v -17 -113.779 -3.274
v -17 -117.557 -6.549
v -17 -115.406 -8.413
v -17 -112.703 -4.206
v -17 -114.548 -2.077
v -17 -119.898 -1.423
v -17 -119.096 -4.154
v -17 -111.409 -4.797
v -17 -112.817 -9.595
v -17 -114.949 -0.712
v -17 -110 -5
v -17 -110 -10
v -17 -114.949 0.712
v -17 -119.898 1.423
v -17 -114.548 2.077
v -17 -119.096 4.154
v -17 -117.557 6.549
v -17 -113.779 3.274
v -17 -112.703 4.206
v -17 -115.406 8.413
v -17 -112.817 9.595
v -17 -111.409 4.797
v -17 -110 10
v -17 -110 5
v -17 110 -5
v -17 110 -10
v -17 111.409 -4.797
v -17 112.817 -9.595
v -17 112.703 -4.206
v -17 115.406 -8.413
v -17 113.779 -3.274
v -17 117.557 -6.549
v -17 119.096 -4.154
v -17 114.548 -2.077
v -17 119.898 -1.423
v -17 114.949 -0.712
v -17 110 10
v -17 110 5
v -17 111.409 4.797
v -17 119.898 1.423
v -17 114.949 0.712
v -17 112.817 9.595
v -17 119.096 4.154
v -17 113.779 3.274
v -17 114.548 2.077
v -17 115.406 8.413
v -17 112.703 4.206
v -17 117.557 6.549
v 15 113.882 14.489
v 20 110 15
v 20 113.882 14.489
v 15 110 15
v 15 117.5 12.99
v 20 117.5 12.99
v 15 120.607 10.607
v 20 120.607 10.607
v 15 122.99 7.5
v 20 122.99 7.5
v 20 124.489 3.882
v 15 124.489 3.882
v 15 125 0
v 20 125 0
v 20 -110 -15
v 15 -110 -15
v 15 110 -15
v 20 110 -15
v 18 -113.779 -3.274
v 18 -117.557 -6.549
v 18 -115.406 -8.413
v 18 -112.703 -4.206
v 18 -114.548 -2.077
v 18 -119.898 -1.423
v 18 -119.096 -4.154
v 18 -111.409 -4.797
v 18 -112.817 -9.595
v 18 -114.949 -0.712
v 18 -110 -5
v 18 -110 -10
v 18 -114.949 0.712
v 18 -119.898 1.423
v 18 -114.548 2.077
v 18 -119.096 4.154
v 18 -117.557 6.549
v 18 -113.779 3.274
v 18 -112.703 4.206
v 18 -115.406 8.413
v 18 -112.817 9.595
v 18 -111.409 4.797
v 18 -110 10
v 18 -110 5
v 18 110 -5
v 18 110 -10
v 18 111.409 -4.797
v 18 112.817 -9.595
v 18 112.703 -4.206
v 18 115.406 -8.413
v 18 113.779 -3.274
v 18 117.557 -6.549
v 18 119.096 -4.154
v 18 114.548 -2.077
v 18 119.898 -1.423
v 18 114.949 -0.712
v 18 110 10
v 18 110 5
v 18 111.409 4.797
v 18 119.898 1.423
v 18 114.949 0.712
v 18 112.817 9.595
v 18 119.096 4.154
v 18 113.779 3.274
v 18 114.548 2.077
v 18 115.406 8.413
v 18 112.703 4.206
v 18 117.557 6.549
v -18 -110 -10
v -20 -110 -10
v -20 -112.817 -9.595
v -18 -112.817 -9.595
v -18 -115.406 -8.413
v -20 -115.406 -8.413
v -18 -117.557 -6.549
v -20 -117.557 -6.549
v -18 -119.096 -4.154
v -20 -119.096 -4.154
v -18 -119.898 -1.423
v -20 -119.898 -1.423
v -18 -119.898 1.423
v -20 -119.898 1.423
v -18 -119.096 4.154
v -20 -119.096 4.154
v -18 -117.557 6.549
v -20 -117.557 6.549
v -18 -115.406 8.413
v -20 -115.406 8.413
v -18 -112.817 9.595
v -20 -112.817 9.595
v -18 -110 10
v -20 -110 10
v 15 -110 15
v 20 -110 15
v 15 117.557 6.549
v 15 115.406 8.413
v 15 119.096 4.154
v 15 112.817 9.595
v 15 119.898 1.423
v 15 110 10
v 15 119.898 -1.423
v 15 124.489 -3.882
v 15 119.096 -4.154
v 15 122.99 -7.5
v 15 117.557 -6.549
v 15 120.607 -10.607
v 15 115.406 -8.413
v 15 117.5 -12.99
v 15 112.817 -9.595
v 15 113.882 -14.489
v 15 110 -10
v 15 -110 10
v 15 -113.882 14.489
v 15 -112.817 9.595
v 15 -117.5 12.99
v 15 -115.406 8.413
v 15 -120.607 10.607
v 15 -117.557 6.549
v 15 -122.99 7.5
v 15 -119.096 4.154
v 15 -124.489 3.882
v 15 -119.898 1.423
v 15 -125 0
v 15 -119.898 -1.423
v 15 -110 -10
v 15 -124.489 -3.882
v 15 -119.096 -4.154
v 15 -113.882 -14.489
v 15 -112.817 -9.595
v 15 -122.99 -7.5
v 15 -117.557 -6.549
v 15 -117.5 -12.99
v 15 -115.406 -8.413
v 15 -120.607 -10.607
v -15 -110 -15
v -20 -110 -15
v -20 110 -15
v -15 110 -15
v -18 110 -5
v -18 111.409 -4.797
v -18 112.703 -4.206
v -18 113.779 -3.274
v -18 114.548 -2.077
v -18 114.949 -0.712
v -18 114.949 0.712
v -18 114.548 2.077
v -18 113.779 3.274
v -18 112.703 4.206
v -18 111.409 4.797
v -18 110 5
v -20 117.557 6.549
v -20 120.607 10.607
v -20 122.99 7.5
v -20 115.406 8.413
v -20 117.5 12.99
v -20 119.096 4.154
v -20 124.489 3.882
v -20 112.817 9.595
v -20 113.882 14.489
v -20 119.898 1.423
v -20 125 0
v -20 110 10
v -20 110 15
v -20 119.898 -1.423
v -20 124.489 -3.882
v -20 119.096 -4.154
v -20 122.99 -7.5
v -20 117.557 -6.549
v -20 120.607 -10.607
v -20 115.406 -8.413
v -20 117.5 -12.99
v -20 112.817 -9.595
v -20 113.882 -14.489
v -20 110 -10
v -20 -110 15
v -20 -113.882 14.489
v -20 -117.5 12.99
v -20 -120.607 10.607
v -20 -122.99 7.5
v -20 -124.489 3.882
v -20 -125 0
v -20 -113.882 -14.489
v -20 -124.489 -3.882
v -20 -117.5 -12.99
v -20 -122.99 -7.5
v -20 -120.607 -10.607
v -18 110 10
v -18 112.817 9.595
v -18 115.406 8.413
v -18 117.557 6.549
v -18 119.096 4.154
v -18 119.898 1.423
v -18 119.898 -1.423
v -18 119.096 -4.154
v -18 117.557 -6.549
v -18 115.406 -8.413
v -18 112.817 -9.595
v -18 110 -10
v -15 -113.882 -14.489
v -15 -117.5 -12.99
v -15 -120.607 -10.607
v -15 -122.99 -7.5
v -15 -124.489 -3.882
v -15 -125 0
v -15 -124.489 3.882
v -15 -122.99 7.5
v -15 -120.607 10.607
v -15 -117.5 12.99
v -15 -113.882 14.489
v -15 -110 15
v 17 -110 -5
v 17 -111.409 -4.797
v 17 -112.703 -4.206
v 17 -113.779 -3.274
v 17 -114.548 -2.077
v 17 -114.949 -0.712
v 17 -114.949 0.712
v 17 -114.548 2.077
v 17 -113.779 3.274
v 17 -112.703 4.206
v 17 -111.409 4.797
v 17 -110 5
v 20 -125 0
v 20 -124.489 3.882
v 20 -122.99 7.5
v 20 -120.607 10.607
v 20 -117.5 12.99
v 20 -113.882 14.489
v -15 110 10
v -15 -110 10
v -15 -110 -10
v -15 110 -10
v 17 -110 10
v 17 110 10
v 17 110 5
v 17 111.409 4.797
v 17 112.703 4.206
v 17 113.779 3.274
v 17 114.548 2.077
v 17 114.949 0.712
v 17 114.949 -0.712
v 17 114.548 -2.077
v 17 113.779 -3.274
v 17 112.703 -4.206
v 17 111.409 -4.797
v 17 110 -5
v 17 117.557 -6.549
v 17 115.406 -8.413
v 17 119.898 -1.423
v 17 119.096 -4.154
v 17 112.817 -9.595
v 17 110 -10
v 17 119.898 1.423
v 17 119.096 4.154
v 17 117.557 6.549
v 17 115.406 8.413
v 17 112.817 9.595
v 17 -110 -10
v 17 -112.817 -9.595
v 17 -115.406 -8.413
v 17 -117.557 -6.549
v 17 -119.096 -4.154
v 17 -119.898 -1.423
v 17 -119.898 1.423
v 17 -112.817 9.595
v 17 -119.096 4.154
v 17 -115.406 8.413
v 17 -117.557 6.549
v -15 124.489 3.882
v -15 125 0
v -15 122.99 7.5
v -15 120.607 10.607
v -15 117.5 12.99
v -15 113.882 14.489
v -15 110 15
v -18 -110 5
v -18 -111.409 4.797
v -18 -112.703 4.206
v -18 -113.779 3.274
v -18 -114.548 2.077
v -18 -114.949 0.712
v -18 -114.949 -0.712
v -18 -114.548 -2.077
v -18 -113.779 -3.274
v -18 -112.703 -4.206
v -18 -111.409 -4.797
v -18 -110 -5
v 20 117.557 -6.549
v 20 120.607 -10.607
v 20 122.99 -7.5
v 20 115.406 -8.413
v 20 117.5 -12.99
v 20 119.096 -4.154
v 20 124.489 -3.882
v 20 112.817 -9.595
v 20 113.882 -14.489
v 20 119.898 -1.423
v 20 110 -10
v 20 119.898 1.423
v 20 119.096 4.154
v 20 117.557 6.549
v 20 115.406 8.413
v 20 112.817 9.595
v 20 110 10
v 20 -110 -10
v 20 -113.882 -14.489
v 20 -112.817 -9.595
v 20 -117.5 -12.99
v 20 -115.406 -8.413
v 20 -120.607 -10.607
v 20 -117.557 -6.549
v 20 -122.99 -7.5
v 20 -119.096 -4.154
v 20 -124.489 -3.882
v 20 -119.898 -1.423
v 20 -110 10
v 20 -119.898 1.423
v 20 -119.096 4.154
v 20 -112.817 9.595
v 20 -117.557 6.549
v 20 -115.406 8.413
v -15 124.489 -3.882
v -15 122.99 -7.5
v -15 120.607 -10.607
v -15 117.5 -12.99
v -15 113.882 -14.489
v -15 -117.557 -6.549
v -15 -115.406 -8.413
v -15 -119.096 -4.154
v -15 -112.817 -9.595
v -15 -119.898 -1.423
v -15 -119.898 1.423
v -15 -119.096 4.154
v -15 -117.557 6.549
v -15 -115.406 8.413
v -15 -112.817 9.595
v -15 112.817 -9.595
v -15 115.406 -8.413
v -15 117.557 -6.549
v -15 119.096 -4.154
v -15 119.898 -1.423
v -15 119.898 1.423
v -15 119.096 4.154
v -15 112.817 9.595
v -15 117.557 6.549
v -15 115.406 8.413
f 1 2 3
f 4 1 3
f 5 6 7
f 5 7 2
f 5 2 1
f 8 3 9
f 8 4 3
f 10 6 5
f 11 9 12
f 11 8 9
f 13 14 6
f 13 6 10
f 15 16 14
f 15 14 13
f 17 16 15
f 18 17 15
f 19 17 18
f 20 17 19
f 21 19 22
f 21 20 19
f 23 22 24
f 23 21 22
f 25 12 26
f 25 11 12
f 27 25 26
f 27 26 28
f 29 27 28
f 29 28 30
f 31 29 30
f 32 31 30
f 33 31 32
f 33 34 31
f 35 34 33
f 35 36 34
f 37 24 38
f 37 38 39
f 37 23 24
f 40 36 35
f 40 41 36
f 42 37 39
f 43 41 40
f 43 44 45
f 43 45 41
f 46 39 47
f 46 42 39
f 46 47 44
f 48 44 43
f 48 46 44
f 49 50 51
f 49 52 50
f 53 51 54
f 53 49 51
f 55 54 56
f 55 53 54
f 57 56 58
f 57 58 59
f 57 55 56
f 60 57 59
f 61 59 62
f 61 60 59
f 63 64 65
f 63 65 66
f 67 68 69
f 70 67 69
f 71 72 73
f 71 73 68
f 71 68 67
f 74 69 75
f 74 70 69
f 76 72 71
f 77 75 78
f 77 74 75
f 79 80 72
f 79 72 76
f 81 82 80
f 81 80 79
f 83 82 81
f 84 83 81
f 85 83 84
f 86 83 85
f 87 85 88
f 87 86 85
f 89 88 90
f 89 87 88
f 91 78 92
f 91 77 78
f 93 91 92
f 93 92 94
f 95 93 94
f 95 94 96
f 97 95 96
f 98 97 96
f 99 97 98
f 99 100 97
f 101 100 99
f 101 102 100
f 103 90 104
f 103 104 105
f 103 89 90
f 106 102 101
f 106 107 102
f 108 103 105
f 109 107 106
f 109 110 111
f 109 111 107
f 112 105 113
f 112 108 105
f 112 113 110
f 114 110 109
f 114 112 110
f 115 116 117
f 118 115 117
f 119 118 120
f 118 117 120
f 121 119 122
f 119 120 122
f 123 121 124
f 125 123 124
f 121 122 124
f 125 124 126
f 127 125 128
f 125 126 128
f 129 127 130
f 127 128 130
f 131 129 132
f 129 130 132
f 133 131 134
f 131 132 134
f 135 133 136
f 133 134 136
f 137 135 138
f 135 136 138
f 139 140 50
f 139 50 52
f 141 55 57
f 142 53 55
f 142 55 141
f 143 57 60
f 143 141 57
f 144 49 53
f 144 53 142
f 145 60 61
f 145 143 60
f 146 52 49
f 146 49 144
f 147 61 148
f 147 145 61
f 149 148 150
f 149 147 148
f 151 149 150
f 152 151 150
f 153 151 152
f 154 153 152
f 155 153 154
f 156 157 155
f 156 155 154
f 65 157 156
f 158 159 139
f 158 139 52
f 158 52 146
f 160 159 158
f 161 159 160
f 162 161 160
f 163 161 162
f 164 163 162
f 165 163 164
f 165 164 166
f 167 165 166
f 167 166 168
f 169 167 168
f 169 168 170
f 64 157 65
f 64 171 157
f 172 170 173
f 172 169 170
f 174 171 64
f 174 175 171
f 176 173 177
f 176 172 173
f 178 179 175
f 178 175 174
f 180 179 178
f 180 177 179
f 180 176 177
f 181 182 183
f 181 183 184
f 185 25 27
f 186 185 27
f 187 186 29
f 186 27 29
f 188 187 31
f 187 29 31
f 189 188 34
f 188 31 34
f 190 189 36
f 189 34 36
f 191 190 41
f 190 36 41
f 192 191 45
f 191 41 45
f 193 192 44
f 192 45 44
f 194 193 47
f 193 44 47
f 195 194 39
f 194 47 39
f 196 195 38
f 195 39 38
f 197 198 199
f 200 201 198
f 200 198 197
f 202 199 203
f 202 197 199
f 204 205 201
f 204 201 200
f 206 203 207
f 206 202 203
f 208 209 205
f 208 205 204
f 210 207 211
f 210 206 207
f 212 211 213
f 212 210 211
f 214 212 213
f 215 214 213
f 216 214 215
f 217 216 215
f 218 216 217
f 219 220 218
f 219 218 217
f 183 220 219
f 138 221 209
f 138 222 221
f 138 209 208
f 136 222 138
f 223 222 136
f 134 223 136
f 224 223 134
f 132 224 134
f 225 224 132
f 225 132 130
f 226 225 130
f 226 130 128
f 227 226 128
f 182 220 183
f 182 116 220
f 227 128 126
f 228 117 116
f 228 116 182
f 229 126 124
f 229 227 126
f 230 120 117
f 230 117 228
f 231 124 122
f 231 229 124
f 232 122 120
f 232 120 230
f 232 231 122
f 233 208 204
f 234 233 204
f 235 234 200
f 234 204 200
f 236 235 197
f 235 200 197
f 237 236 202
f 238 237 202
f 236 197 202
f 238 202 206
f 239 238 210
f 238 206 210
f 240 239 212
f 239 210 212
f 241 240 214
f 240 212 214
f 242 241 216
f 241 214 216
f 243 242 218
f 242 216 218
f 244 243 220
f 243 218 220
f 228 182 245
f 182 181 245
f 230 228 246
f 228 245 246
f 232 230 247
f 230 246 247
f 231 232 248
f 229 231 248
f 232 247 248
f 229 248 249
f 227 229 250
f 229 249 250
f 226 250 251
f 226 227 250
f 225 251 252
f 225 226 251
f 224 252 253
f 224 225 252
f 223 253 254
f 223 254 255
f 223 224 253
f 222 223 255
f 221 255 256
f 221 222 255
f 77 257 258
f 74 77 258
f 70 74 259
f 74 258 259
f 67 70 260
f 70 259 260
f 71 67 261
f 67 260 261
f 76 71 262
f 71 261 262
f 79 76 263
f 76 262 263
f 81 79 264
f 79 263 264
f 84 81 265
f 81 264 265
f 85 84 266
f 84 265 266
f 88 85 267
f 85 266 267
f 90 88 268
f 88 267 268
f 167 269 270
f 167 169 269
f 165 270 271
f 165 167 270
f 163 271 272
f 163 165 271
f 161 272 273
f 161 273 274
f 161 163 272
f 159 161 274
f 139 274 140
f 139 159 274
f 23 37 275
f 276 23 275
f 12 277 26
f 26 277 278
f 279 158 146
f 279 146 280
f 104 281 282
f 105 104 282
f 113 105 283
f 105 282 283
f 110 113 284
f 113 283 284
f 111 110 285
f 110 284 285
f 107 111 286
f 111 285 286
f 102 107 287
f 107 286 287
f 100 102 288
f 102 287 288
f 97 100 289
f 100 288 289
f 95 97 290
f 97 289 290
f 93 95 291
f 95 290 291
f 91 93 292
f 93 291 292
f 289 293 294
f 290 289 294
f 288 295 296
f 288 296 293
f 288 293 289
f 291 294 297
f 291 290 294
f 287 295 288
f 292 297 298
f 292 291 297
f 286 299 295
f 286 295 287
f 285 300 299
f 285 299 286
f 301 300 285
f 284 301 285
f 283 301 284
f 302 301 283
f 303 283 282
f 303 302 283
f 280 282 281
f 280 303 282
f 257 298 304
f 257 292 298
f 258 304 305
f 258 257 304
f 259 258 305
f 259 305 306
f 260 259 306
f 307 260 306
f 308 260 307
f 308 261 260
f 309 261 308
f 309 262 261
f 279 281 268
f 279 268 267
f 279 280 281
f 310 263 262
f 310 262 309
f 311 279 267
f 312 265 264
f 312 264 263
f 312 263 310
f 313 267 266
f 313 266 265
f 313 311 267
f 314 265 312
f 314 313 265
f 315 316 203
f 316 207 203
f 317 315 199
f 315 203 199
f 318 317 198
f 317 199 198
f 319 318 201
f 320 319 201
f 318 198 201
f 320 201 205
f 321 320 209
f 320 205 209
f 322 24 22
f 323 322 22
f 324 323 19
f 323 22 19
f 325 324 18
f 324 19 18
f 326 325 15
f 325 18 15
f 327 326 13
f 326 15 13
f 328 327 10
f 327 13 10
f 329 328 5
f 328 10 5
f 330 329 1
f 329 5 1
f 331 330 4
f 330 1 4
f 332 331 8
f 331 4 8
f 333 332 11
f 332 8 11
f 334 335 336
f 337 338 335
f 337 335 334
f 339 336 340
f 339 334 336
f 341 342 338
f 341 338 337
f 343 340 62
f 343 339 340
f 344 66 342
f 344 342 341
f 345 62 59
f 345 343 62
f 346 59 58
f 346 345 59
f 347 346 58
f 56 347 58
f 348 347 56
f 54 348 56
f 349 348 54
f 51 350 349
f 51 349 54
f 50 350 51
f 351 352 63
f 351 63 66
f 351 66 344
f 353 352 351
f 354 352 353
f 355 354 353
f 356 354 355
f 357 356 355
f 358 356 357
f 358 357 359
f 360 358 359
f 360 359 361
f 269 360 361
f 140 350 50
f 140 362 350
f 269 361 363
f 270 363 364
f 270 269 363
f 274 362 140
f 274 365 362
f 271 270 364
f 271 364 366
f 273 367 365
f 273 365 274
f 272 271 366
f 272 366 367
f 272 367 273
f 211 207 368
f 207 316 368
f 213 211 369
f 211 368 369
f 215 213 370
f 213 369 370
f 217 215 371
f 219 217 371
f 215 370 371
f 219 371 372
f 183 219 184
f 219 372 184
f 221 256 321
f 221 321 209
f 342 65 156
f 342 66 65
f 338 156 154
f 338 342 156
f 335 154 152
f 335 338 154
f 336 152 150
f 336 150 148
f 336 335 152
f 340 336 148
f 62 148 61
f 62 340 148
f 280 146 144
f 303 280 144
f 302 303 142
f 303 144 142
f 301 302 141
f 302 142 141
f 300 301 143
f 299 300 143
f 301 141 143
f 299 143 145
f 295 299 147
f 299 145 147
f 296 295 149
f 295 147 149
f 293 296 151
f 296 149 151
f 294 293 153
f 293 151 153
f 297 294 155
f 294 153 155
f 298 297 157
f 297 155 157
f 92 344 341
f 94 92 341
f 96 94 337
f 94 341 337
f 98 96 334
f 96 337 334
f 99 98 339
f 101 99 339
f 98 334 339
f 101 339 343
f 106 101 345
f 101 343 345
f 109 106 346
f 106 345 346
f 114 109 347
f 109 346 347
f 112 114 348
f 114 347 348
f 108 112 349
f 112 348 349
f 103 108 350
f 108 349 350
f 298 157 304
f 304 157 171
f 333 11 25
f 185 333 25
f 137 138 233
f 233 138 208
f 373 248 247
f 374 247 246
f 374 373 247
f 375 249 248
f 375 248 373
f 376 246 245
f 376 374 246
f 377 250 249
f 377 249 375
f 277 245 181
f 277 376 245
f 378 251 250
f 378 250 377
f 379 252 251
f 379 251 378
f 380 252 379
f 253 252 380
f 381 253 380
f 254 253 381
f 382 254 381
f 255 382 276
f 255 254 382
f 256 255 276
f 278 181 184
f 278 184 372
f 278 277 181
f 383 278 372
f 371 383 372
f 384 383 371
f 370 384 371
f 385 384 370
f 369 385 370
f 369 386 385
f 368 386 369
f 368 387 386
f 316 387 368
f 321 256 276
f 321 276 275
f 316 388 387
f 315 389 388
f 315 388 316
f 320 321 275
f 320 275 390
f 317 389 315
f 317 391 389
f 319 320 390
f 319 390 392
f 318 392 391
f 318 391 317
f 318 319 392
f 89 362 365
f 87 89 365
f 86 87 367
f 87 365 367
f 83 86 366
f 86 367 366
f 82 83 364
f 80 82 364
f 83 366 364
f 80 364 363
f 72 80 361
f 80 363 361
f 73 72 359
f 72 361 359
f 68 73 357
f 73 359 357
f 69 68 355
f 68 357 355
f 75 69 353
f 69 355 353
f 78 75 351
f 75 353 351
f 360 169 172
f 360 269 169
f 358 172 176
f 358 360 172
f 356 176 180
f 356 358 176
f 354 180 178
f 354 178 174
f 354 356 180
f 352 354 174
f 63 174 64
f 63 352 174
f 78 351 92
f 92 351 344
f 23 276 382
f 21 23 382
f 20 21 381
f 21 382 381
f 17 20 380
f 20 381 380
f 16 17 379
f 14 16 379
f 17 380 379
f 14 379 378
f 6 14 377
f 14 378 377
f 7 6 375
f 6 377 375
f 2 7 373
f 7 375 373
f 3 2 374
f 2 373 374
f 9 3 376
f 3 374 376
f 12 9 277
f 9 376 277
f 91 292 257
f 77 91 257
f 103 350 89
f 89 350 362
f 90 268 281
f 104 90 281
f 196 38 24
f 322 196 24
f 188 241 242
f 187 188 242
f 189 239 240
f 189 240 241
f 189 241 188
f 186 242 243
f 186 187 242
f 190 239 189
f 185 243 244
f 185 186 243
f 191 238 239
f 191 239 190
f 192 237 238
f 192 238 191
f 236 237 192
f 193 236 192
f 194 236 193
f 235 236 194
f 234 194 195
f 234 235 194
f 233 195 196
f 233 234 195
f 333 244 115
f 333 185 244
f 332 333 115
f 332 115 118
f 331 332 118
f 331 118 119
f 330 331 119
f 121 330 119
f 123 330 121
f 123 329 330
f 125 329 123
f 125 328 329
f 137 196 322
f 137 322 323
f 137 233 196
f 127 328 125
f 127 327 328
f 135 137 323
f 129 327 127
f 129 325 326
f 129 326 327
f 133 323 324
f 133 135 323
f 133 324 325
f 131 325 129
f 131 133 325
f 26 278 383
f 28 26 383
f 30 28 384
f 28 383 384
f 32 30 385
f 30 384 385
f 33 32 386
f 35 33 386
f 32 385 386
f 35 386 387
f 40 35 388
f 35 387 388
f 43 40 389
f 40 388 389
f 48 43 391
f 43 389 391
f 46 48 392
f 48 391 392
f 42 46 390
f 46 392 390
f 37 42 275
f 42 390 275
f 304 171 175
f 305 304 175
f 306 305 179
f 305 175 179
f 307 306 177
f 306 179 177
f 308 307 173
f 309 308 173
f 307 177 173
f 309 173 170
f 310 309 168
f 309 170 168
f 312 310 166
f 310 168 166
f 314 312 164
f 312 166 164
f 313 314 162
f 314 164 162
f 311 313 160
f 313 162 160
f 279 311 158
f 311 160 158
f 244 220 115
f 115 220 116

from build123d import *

# Parameters (mm, degrees)
F1_DEPTH      = 125
F1_DEPTH_BACK = 125
F6_DEPTH      = 5.001
F7_DEPTH      = 5.001
F8_DEPTH      = 2
F9_DEPTH      = 2
F10_DEPTH     = 2
F11_DEPTH     = 2
F12_W         = 30
F12_H         = 250
F13_DEPTH     = 30.001
F14_R         = 14.99999


# Not quite as in the source:
# - a fillet or chamfer is up to 0.001 mm smaller than in the source, because OpenCascade refuses the exact size


with BuildPart() as f1:
    # F0 (on Front) → F1 (new body, two sides)
    with BuildSketch(Plane.XZ) as f1_sk:
        Polygon((20, -15), (20, 15), (-20, 15), (-20, -15), (-15, -15), (-15, 10), (15, 10), (15, -15), align=None)
    extrude(amount=F1_DEPTH)
    extrude(f1_sk.sketch, amount=-F1_DEPTH_BACK)

    # F2 (on face) → F6 (cut, through all)
    with BuildSketch(Plane(origin=(15, 0, 0), x_dir=(0, -1, 0), z_dir=(-1, 0, 0))):
        with BuildLine():
            Line((-110, -5), (110, -5))
            ThreePointArc((110, -5), (115, 0), (110, 5))
            Line((110, 5), (-110, 5))
            ThreePointArc((-110, 5), (-115, 0), (-110, -5))
        make_face()
    extrude(amount=-F6_DEPTH, mode=Mode.SUBTRACT)

    # F4 (on face) → F7 (cut, through all)
    with BuildSketch(Plane.YZ.offset(-15)):
        with BuildLine():
            Line((110, 5), (-110, 5))
            ThreePointArc((-110, 5), (-115, 0), (-110, -5))
            Line((-110, -5), (110, -5))
            ThreePointArc((110, -5), (115, 0), (110, 5))
        make_face()
    extrude(amount=-F7_DEPTH, mode=Mode.SUBTRACT)

    # F2 (on face) → F8 (cut)
    with BuildSketch(Plane(origin=(15, 0, 0), x_dir=(0, -1, 0), z_dir=(-1, 0, 0))):
        with BuildLine():
            Line((-110, -10), (110, -10))
            ThreePointArc((110, -10), (120, 0), (110, 10))
            Line((110, 10), (-110, 10))
            ThreePointArc((-110, 10), (-120, 0), (-110, -10))
        make_face()
        with BuildLine():
            ThreePointArc((110, 5), (115, 0), (110, -5))
            Line((110, -5), (-110, -5))
            ThreePointArc((-110, -5), (-115, 0), (-110, 5))
            Line((-110, 5), (110, 5))
        make_face(mode=Mode.SUBTRACT)
    extrude(amount=-F8_DEPTH, mode=Mode.SUBTRACT)

    # F3 (on face) → F9 (cut)
    with BuildSketch(Plane.YZ.offset(20)):
        with BuildLine():
            ThreePointArc((-110, 10), (-120, 0), (-110, -10))
            Line((-110, -10), (110, -10))
            ThreePointArc((110, -10), (120, 0), (110, 10))
            Line((110, 10), (-110, 10))
        make_face()
        with BuildLine():
            ThreePointArc((-110, -5), (-115, 0), (-110, 5))
            Line((-110, 5), (110, 5))
            ThreePointArc((110, 5), (115, 0), (110, -5))
            Line((110, -5), (-110, -5))
        make_face(mode=Mode.SUBTRACT)
    extrude(amount=-F9_DEPTH, mode=Mode.SUBTRACT)

    # F5 (on face) → F10 (cut)
    with BuildSketch(Plane(origin=(-20, 0, 0), x_dir=(0, -1, 0), z_dir=(-1, 0, 0))):
        with BuildLine():
            Line((110, 10), (-110, 10))
            ThreePointArc((-110, 10), (-120, 0), (-110, -10))
            Line((-110, -10), (110, -10))
            ThreePointArc((110, -10), (120, 0), (110, 10))
        make_face()
        with BuildLine():
            ThreePointArc((-110, -5), (-115, 0), (-110, 5))
            Line((-110, 5), (110, 5))
            ThreePointArc((110, 5), (115, 0), (110, -5))
            Line((110, -5), (-110, -5))
        make_face(mode=Mode.SUBTRACT)
    extrude(amount=-F10_DEPTH, mode=Mode.SUBTRACT)

    # F4 (on face) → F11 (cut)
    with BuildSketch(Plane.YZ.offset(-15)):
        with BuildLine():
            Line((110, 10), (-110, 10))
            ThreePointArc((-110, 10), (-120, 0), (-110, -10))
            Line((-110, -10), (110, -10))
            ThreePointArc((110, -10), (120, 0), (110, 10))
        make_face()
        with BuildLine():
            ThreePointArc((-110, -5), (-115, 0), (-110, 5))
            Line((-110, 5), (110, 5))
            ThreePointArc((110, 5), (115, 0), (110, -5))
            Line((110, -5), (-110, -5))
        make_face(mode=Mode.SUBTRACT)
    extrude(amount=-F11_DEPTH, mode=Mode.SUBTRACT)

    # F12 (on face) → F13 (cut, through all)
    with BuildSketch(Plane.XY.offset(15)):
        Rectangle(F12_W, F12_H)
    extrude(amount=-F13_DEPTH, mode=Mode.SUBTRACT)

    # F14 (radius 15 in the source; OpenCascade refuses exactly that, so slightly less here)
    f14_edges = [f1.edges().sort_by_distance(p)[0] for p in [
        (-17.5, 125, -15),
        (17.5, 125, -15),
        (-17.5, -125, -15),
        (17.5, -125, -15),
        (-17.5, 125, 15),
        (17.5, 125, 15),
        (-17.5, -125, 15),
        (17.5, -125, 15),
    ]]
    fillet(f14_edges, radius=F14_R)


solid = f1.part
